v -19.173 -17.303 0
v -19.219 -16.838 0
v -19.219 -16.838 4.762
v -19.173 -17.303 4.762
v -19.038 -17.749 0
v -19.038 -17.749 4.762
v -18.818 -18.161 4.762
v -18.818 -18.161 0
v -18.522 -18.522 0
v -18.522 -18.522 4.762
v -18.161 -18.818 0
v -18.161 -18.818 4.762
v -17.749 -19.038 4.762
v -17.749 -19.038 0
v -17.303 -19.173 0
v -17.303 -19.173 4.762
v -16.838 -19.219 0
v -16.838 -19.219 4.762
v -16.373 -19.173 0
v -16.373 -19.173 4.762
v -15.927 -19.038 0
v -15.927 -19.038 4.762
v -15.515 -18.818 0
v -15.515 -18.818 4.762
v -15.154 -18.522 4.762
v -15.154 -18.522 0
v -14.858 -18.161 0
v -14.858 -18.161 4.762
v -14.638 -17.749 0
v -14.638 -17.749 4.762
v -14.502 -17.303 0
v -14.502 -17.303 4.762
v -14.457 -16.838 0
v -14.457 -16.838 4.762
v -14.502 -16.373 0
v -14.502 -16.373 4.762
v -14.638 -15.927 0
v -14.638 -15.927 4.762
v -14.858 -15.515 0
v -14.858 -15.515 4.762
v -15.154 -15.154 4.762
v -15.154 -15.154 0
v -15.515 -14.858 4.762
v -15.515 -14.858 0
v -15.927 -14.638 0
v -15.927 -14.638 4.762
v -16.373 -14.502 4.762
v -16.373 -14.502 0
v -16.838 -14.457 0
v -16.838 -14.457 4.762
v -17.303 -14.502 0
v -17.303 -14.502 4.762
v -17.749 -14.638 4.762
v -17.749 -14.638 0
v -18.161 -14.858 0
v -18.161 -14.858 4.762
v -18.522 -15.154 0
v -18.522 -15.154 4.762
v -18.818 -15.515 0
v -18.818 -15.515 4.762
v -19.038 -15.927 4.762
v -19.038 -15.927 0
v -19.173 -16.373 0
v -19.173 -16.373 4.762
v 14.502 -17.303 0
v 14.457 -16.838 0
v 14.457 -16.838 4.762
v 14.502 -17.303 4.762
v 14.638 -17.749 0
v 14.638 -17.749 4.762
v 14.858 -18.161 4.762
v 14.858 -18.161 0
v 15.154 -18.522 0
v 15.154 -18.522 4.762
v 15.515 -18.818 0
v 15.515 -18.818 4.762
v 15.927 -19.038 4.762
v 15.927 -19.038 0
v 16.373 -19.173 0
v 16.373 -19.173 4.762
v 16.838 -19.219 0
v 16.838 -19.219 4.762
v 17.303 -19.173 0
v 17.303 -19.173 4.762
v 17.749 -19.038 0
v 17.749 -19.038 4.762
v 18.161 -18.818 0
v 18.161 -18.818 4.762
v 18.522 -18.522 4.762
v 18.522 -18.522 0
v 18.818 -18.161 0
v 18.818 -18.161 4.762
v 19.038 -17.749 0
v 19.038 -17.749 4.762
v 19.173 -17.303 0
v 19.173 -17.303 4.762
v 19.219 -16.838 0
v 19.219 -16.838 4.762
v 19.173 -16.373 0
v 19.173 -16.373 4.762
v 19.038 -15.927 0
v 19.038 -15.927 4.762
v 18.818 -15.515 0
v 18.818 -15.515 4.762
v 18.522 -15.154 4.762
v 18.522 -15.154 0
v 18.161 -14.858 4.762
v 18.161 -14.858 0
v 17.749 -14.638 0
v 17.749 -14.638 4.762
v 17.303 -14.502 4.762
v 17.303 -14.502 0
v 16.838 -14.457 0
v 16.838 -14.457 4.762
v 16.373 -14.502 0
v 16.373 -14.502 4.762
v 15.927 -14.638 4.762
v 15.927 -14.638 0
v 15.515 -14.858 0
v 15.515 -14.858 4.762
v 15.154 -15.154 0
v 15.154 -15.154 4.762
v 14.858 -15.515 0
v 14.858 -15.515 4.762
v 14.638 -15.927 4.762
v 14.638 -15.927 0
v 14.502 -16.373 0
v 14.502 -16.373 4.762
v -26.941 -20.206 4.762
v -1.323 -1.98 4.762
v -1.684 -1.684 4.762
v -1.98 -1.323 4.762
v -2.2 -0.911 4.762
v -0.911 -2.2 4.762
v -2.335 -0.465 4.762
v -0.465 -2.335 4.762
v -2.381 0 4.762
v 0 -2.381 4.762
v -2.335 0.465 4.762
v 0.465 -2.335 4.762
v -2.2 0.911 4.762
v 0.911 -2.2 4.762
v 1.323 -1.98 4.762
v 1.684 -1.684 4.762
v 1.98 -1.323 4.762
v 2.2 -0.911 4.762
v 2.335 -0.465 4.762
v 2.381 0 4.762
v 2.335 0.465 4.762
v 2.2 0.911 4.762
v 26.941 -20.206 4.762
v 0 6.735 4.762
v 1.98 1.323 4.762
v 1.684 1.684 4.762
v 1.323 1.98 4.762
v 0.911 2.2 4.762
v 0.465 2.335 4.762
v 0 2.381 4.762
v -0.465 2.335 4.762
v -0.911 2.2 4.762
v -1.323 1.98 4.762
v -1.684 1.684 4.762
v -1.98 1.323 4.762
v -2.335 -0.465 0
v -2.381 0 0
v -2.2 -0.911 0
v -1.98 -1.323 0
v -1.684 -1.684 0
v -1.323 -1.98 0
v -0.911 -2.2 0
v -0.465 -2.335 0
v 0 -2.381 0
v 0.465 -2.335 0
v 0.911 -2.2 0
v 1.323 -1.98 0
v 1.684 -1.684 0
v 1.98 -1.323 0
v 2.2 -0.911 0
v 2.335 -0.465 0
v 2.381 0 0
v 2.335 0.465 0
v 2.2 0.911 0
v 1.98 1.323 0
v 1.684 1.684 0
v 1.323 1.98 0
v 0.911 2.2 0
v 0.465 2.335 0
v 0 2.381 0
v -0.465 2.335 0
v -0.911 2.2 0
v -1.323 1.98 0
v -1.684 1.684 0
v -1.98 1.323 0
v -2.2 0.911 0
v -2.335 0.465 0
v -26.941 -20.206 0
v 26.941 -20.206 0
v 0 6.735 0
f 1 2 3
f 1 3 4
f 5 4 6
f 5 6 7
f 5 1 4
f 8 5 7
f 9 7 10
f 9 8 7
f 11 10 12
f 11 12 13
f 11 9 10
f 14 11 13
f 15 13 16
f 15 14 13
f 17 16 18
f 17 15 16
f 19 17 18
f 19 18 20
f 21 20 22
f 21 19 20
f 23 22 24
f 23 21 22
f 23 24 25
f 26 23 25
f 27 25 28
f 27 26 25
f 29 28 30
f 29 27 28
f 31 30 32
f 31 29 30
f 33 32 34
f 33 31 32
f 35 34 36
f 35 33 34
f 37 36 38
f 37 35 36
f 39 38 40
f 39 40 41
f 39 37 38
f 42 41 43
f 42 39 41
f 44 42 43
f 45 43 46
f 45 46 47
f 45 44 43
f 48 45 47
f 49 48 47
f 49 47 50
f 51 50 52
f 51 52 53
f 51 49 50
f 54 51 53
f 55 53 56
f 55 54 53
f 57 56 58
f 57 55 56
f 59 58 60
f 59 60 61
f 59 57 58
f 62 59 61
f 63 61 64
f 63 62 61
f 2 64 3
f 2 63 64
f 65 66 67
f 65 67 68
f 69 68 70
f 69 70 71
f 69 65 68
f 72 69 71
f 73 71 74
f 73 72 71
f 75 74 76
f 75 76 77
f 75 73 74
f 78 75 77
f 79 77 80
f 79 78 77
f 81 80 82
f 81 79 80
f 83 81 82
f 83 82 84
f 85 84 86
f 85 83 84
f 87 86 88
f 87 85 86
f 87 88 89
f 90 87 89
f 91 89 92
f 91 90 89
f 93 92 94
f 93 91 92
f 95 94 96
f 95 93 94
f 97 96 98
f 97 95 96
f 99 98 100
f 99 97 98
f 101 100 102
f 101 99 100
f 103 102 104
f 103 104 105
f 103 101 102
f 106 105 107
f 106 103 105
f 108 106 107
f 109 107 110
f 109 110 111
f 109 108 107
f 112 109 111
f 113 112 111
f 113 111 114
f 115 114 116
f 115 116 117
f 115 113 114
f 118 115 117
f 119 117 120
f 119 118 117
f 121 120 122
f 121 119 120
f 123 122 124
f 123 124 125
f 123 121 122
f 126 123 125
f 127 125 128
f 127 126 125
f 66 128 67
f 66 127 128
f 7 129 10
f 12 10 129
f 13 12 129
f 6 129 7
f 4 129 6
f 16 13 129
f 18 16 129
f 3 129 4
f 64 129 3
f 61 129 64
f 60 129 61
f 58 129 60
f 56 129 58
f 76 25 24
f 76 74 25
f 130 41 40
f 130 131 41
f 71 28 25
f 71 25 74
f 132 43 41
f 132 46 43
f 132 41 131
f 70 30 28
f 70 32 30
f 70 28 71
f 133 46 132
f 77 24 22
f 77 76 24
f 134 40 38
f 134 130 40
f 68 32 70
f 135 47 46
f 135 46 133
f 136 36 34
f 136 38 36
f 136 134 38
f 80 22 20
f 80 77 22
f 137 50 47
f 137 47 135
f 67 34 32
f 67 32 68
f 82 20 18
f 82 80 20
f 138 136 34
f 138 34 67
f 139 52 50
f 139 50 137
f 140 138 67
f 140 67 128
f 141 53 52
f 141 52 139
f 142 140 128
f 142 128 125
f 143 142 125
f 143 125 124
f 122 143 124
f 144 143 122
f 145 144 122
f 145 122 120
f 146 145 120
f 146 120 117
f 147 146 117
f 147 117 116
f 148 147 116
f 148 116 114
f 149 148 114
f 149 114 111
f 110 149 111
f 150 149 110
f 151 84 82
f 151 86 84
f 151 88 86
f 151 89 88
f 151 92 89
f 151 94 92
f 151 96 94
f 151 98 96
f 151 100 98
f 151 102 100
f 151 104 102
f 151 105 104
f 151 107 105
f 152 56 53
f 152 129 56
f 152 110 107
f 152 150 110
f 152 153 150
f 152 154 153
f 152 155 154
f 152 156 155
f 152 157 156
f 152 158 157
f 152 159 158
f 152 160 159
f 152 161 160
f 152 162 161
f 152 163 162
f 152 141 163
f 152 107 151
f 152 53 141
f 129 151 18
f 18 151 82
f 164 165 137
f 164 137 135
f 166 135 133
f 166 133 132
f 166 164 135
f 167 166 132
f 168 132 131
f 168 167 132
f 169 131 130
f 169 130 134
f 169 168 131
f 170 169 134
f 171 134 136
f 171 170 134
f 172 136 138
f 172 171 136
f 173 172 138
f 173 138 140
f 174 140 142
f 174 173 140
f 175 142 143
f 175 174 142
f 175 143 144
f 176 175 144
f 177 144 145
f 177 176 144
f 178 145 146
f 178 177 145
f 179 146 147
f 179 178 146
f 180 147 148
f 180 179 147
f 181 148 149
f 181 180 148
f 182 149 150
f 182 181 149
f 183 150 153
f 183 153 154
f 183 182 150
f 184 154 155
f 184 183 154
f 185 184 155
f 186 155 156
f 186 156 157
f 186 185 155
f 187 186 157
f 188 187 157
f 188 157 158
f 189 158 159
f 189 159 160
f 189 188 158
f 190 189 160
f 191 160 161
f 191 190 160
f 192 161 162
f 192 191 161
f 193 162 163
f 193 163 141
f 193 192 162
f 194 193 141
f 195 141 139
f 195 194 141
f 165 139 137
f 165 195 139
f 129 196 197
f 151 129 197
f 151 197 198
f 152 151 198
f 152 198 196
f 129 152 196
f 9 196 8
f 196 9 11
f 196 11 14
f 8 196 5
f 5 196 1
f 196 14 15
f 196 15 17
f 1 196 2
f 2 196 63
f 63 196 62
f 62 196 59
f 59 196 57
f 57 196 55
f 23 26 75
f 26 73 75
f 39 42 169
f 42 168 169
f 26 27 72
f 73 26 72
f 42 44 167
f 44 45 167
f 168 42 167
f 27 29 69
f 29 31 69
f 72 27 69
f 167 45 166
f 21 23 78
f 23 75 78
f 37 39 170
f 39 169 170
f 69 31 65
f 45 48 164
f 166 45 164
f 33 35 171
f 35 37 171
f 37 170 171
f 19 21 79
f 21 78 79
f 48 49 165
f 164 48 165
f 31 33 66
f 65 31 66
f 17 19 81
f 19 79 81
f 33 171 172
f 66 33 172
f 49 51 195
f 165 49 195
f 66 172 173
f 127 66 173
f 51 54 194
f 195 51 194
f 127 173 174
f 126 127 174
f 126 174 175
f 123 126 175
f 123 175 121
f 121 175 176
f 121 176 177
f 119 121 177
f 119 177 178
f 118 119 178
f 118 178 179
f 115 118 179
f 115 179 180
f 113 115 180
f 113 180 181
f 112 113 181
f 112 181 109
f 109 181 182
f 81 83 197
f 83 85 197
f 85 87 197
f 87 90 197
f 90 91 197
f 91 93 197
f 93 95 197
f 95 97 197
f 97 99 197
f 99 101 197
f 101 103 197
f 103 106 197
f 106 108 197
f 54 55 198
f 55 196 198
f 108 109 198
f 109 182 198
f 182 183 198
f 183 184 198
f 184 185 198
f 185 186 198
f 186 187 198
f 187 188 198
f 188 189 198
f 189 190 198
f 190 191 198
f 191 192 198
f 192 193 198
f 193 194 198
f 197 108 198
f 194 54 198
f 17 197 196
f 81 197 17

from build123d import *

# Parameters (mm, degrees)
SKETCH1_R           = 2.38125
BOSS_EXTRUDE1_DEPTH = 4.7625


with BuildPart() as part:
    # Sketch1 → Boss-Extrude1 (new body)
    with BuildSketch(Plane.XY):
        Polygon((-26.940768363, -20.205576272), (26.940768363, -20.205576272), (0, 6.735192091), align=None)
        with Locations(Location((0, 0, 0), (0, 0, 180))):
            Circle(SKETCH1_R, mode=Mode.SUBTRACT)
        with Locations(Location((-16.837980227, -16.837980227, 0), (0, 0, 180))):
            Circle(SKETCH1_R, mode=Mode.SUBTRACT)
        with Locations(Location((16.837980227, -16.837980227, 0), (0, 0, 180))):
            Circle(SKETCH1_R, mode=Mode.SUBTRACT)
    extrude(amount=BOSS_EXTRUDE1_DEPTH)


solid = part.part
